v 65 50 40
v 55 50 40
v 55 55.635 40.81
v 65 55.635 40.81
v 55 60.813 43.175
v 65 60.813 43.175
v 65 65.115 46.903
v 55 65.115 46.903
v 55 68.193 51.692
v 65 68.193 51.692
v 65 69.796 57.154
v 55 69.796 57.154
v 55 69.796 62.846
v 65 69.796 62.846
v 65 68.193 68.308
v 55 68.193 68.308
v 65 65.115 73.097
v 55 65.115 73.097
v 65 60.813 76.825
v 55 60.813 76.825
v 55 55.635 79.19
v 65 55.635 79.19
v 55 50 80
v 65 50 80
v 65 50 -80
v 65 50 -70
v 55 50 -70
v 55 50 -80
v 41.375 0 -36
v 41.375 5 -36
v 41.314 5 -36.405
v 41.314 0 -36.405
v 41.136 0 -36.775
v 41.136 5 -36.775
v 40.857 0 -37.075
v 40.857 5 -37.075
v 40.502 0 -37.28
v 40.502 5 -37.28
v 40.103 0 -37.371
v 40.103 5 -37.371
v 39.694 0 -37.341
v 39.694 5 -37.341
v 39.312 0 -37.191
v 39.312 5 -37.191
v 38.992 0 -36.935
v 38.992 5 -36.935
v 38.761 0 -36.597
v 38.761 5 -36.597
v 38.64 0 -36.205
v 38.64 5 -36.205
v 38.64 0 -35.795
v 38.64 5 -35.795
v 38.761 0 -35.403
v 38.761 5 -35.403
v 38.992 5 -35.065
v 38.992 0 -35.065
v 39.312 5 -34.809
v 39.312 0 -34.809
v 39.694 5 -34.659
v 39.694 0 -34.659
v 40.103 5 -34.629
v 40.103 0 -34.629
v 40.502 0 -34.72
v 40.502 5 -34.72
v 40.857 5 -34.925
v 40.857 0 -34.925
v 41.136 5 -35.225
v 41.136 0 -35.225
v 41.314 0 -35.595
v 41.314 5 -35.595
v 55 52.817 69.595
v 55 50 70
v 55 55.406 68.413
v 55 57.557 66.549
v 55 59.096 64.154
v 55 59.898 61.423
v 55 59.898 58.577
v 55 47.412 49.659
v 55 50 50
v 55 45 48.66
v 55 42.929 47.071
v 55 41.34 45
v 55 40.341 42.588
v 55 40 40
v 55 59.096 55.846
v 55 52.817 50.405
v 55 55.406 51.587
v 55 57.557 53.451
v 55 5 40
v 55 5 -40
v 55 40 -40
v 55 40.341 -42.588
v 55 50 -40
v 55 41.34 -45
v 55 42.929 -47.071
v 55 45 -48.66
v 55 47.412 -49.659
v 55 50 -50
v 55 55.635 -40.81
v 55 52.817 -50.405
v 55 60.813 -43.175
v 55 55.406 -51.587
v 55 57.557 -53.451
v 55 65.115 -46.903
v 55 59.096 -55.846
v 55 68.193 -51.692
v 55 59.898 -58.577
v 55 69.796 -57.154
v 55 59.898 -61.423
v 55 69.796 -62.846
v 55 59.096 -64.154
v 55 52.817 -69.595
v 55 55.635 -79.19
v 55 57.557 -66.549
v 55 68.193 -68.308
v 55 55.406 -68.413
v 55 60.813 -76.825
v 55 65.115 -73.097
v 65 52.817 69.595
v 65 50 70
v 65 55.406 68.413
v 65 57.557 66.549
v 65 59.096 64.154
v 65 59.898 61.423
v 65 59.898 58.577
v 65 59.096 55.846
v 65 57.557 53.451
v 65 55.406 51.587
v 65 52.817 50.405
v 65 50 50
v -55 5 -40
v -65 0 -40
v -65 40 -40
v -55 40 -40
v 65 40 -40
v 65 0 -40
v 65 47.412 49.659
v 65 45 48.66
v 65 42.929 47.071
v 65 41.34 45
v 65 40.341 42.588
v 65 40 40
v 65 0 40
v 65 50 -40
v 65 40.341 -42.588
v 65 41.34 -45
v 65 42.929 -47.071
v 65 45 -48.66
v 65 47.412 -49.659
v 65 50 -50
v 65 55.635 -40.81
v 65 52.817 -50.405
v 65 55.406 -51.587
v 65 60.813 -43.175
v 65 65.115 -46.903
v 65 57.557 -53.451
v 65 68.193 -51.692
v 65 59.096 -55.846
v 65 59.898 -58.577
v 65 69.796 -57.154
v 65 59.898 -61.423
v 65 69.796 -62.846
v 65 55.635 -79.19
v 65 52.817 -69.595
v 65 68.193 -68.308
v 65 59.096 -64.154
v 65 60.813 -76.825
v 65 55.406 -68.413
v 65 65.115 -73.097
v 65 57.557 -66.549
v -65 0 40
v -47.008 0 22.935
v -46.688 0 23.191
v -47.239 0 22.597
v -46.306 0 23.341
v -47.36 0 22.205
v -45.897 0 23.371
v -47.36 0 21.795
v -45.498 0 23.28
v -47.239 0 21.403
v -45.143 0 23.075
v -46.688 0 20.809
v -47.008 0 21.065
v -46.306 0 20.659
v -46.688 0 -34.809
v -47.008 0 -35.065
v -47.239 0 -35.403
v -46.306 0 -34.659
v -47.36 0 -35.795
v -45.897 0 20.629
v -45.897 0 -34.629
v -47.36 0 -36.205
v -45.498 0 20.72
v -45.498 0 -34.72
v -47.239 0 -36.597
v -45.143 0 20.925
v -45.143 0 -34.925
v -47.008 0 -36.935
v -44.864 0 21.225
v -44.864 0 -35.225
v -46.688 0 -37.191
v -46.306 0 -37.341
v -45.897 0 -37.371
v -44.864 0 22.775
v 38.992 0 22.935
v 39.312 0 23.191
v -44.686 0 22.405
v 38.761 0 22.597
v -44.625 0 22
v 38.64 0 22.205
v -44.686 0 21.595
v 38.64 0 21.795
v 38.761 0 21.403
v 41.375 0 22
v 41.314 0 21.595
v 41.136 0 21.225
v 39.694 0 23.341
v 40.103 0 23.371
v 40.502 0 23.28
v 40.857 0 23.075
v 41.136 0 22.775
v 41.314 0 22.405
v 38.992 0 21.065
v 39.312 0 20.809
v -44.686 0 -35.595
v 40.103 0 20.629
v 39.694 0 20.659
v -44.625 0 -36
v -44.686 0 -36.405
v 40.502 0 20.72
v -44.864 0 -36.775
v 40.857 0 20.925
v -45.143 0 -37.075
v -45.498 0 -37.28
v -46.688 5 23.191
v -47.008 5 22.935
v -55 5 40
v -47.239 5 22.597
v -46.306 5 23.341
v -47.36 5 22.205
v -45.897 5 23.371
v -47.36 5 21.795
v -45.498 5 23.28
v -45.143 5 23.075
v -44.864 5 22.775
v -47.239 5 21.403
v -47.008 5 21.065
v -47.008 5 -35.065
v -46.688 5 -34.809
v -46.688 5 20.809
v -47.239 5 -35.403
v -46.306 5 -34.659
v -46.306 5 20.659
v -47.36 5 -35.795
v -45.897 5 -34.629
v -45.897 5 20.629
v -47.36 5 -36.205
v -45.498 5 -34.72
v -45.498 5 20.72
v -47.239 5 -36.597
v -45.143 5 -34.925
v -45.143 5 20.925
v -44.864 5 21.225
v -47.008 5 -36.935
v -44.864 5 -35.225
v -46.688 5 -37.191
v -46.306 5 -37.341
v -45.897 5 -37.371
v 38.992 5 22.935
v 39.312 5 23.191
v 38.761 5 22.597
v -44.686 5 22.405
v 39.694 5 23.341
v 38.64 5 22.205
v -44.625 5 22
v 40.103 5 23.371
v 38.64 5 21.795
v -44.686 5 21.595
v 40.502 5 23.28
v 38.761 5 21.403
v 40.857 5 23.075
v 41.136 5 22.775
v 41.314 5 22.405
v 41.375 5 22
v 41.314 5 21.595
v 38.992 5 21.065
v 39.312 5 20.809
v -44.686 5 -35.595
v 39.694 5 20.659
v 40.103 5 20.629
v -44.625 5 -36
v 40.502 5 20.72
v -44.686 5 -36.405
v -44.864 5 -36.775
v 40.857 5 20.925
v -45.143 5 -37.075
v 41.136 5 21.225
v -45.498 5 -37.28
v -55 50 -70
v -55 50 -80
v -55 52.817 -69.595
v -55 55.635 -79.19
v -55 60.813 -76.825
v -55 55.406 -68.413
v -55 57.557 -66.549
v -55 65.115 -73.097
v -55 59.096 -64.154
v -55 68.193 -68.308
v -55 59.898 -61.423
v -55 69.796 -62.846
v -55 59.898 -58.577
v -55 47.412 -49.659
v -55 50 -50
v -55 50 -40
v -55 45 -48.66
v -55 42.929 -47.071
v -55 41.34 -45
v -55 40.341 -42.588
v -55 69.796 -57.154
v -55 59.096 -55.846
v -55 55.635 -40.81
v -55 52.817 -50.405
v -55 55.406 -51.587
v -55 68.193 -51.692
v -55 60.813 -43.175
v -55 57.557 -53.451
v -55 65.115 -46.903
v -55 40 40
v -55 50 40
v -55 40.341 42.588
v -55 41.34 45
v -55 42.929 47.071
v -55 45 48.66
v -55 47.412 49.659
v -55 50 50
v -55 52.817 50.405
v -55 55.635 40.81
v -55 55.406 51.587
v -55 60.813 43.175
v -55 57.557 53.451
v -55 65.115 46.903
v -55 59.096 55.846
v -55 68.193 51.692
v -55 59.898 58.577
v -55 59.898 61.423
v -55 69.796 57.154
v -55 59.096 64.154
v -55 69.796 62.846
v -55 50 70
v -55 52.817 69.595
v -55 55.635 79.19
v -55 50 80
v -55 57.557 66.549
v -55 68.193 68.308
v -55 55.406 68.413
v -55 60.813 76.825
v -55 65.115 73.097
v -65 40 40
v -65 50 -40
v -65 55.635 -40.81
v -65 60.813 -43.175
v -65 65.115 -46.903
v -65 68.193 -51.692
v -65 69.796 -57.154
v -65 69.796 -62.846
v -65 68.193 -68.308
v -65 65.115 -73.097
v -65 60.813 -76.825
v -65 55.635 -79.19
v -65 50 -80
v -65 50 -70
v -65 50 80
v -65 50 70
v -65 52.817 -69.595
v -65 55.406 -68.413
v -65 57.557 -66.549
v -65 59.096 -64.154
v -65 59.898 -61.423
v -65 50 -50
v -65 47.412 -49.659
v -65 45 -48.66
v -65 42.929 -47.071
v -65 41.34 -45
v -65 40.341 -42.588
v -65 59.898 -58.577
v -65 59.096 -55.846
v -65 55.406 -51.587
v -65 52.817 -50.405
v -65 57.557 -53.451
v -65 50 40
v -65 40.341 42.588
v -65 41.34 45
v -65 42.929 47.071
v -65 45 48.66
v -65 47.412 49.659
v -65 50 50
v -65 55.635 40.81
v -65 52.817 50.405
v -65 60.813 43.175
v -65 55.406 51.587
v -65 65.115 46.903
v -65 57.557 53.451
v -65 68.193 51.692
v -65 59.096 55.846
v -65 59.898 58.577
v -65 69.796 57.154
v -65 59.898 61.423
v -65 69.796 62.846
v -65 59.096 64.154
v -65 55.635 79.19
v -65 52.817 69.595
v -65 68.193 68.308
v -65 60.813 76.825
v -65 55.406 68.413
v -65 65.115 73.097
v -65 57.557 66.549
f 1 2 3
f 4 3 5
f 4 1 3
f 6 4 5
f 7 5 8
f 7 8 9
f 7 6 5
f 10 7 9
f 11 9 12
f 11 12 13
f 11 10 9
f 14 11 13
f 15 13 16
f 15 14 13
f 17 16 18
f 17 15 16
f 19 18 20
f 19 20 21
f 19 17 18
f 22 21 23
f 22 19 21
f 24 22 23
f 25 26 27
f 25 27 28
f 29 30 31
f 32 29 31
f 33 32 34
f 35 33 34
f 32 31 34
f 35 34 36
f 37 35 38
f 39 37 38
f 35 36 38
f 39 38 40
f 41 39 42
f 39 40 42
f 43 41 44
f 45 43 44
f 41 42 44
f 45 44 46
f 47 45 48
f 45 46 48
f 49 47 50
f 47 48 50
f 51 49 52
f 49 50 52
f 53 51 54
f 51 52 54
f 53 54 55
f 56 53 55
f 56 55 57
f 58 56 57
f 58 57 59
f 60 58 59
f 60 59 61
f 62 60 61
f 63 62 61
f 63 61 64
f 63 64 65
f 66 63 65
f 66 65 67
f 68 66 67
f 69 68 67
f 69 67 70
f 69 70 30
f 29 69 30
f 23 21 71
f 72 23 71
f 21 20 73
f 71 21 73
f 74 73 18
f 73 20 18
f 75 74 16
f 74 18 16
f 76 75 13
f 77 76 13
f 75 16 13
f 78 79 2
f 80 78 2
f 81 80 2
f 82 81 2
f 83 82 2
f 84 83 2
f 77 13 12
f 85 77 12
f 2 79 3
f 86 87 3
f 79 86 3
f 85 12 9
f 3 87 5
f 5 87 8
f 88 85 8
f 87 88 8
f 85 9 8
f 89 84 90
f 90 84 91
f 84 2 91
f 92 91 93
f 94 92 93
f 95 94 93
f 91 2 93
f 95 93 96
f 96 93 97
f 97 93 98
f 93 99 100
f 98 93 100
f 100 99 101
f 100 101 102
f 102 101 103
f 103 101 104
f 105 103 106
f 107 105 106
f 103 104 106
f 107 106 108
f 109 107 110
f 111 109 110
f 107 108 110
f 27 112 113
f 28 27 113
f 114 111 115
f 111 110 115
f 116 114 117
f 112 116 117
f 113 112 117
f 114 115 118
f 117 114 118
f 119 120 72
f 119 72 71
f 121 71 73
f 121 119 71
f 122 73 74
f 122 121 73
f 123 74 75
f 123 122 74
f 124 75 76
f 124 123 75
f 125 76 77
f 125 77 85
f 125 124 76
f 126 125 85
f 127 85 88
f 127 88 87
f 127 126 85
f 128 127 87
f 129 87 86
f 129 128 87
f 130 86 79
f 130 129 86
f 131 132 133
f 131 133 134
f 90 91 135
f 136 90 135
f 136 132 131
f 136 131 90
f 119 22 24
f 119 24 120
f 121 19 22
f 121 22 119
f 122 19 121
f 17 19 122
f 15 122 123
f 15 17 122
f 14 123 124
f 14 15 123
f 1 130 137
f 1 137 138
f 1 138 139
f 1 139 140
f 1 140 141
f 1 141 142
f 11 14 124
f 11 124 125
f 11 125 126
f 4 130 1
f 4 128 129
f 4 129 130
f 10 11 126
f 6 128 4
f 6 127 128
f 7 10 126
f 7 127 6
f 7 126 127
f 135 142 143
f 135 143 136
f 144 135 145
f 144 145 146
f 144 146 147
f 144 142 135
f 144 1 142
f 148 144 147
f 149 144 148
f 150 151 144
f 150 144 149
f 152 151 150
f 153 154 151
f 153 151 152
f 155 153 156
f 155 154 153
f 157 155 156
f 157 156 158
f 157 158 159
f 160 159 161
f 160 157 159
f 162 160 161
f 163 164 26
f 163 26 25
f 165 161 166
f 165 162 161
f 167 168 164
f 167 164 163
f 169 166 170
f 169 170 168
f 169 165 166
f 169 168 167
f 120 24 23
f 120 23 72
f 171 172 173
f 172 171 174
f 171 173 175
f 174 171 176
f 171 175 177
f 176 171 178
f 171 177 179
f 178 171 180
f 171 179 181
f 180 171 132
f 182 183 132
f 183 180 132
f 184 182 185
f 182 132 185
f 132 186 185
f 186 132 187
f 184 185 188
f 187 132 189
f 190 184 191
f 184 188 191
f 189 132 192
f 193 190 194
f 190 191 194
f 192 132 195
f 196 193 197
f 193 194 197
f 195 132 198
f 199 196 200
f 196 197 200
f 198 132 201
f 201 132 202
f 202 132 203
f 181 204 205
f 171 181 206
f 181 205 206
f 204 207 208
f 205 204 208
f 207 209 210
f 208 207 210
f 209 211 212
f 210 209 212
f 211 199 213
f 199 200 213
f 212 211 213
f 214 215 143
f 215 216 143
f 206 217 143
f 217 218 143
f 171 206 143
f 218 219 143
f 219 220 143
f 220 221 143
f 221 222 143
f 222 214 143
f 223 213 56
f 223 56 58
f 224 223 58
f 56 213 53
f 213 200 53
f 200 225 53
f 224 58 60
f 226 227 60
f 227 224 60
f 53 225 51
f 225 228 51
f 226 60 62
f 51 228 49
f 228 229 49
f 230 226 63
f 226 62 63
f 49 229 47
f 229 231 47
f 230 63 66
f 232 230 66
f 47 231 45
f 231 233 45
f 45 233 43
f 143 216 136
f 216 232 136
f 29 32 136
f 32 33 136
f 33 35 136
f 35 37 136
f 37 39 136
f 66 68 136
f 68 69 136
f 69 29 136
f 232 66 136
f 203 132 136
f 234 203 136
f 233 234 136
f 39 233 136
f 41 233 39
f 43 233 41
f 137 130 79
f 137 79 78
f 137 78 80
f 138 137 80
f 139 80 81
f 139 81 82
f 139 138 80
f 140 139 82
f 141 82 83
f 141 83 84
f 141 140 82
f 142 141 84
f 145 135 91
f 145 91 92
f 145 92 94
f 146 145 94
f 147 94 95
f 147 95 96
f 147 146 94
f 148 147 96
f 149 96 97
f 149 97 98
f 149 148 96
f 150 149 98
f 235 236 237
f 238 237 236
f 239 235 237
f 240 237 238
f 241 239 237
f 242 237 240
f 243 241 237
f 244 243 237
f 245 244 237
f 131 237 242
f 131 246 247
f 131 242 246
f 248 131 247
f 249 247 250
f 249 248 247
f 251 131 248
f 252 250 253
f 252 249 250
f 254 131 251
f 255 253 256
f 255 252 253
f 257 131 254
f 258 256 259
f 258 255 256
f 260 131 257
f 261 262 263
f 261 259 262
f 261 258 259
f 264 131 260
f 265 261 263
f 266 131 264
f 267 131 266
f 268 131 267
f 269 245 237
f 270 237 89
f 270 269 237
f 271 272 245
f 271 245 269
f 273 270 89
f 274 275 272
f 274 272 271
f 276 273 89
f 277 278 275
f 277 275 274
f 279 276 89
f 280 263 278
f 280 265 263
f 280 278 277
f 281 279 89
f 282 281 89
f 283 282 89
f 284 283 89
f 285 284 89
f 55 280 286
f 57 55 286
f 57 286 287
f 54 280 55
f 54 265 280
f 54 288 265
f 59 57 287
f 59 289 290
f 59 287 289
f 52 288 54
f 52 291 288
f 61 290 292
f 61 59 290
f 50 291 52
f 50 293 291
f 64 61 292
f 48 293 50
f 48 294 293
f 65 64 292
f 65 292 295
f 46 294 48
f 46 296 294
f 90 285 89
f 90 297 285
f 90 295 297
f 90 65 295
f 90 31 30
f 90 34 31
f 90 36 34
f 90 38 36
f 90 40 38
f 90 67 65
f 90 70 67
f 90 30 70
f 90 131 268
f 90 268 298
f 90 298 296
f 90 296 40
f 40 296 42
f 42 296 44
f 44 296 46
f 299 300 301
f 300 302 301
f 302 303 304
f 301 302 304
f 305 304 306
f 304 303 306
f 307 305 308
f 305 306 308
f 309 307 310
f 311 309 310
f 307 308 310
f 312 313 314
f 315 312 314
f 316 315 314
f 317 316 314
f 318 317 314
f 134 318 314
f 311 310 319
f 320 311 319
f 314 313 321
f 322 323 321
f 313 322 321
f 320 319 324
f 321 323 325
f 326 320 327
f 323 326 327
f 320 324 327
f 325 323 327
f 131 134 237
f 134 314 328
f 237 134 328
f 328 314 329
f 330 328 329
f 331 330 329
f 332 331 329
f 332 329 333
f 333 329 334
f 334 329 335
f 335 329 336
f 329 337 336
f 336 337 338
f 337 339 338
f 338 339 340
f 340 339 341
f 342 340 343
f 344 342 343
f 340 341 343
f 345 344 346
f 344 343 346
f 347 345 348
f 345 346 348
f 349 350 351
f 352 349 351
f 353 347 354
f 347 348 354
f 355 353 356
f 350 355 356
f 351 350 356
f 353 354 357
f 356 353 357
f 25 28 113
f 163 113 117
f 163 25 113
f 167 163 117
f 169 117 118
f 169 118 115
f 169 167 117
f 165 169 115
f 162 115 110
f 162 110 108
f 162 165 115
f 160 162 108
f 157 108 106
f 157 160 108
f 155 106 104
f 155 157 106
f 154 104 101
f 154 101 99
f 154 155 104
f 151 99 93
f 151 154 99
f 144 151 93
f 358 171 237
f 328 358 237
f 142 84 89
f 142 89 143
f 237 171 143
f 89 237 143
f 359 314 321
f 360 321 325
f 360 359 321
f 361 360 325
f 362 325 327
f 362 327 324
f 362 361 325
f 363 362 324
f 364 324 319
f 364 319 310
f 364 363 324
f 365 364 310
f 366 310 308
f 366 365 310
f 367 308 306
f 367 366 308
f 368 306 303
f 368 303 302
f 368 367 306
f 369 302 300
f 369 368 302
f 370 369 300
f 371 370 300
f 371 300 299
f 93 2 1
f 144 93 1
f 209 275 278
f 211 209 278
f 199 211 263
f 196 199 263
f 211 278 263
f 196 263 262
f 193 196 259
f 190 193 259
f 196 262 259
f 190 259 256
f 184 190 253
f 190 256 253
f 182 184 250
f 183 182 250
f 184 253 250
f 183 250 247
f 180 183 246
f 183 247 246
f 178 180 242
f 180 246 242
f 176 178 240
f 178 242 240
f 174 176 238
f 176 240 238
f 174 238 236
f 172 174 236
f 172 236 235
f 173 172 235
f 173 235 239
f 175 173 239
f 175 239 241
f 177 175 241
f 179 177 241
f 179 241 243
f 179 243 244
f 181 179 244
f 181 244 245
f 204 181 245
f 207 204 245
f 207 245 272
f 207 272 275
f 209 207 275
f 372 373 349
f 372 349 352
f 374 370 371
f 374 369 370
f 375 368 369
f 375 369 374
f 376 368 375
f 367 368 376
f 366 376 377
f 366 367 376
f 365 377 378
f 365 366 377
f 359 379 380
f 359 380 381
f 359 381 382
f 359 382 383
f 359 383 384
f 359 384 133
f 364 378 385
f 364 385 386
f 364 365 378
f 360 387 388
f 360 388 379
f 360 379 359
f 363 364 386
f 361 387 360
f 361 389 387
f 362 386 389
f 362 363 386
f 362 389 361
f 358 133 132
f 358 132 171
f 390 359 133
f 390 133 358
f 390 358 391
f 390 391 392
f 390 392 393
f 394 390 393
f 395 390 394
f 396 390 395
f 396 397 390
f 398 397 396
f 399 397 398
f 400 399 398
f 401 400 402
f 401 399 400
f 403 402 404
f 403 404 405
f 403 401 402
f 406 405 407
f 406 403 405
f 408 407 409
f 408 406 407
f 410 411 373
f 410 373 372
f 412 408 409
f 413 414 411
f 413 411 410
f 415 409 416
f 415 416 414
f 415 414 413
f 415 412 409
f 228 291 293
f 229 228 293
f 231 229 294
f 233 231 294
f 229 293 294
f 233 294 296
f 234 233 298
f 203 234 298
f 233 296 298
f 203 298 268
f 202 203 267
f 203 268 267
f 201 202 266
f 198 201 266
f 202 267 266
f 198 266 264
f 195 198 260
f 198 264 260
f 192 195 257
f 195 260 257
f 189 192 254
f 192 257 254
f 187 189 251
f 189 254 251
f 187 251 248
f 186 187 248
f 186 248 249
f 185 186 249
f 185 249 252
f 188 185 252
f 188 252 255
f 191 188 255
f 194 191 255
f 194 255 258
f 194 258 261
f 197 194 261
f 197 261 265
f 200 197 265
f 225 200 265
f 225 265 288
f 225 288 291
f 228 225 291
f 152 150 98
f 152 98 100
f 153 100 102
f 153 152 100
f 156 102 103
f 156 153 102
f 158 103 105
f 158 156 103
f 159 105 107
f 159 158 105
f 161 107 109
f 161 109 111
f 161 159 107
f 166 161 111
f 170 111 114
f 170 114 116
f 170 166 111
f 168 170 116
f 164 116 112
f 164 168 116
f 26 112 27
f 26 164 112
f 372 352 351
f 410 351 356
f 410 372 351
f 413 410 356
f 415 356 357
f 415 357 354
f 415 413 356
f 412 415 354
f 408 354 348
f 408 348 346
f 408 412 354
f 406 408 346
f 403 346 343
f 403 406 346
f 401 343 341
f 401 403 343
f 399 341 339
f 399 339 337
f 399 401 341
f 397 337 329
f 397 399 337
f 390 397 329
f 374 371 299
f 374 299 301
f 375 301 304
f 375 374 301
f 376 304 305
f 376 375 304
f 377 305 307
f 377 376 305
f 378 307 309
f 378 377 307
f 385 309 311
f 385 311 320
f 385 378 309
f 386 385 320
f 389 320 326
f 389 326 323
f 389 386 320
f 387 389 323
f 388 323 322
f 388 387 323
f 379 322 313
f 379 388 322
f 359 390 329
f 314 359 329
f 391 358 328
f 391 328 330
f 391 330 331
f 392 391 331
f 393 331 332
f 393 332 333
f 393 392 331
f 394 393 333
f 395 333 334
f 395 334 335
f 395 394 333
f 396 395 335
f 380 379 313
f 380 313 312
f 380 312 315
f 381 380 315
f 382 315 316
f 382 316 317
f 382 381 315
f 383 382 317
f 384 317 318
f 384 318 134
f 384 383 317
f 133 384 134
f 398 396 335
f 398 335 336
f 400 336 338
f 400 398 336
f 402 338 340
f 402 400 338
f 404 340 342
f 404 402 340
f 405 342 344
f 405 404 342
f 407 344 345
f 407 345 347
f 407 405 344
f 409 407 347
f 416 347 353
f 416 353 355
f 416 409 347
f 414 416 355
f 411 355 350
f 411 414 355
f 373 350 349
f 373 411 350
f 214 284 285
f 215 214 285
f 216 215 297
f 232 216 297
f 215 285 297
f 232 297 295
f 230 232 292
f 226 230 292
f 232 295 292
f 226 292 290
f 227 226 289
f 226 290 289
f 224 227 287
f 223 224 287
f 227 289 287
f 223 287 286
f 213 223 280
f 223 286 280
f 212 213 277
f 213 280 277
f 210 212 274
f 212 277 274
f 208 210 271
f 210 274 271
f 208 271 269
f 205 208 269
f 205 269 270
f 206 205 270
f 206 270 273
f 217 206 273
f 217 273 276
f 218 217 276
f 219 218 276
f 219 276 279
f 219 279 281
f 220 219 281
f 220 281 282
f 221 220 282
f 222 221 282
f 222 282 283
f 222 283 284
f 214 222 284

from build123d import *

# Parameters (mm, degrees)
SKETCH1_W               = 130
SKETCH1_H               = 80
BOSS_EXTRUDE1_DEPTH     = 5
SKETCH2_W               = 10
SKETCH2_H               = 80
BOSS_EXTRUDE2_DEPTH     = 45
SKETCH3_R               = 1.375
CUT_EXTRUDE1_DEPTH      = 46
CUT_EXTRUDE1_DEPTH_BACK = 6
BOSS_EXTRUDE3_DEPTH     = 10
BOSS_EXTRUDE4_DEPTH     = 10


with BuildPart() as part:
    # Sketch1 → Boss-Extrude1 (new body)
    with BuildSketch(Plane(origin=(0, 0, 0), x_dir=(1, 0, 0), z_dir=(0, 1, 0))):
        Rectangle(SKETCH1_W, SKETCH1_H)
    extrude(amount=BOSS_EXTRUDE1_DEPTH)

    # Sketch2 → Boss-Extrude2 (add)
    with BuildSketch(Plane(origin=(0, 5, 0), x_dir=(1, 0, 0), z_dir=(0, 1, 0))):
        with Locations((60, 0)):
            Rectangle(SKETCH2_W, SKETCH2_H)
        with Locations((-60, 0)):
            Rectangle(SKETCH2_W, SKETCH2_H)
    extrude(amount=BOSS_EXTRUDE2_DEPTH)

    # Sketch3 → Cut-Extrude1 (cut, two sides)
    with BuildSketch(Plane(origin=(0, 5, 0), x_dir=(1, 0, 0), z_dir=(0, 1, 0))) as cut_extrude1_sk:
        with Locations((-46, -22)):
            Circle(SKETCH3_R)
        with Locations((40, -22)):
            Circle(SKETCH3_R)
        with Locations((40, 36)):
            Circle(SKETCH3_R)
        with Locations((-46, 36)):
            Circle(SKETCH3_R)
    extrude(amount=CUT_EXTRUDE1_DEPTH, mode=Mode.SUBTRACT)
    extrude(cut_extrude1_sk.sketch, amount=-CUT_EXTRUDE1_DEPTH_BACK, mode=Mode.SUBTRACT)

    # Sketch4 → Boss-Extrude3 (add)
    with BuildSketch(Plane.ZY.offset(65)):
        with BuildLine():
            Line((-80, 50), (-70, 50))
            ThreePointArc((-70, 50), (-60, 60), (-50, 50))
            Line((-50, 50), (-40, 50))
            ThreePointArc((-40, 50), (-60, 70), (-80, 50))
        make_face()
        with BuildLine():
            Line((-40, 50), (-50, 50))
            ThreePointArc((-50, 50), (-47.071067812, 42.928932188), (-40, 40))
            Line((-40, 40), (-40, 50))
        make_face()
        with BuildLine():
            ThreePointArc((50, 50), (60, 60), (70, 50))
            Line((70, 50), (80, 50))
            ThreePointArc((80, 50), (60, 70), (40, 50))
            Line((40, 50), (50, 50))
        make_face()
        with BuildLine():
            ThreePointArc((40, 40), (47.071067812, 42.928932188), (50, 50))
            Line((50, 50), (40, 50))
            Line((40, 50), (40, 40))
        make_face()
    extrude(amount=-BOSS_EXTRUDE3_DEPTH)

    # Sketch5 → Boss-Extrude4 (add)
    with BuildSketch(Plane(origin=(65, 0, 0), x_dir=(0, 0, -1), z_dir=(1, 0, 0))):
        with BuildLine():
            ThreePointArc((-50, 50), (-47.071067812, 42.928932188), (-40, 40))
            Line((-40, 40), (-40, 50))
            ThreePointArc((-40, 50), (-60, 70), (-80, 50))
            Line((-80, 50), (-70, 50))
            ThreePointArc((-70, 50), (-60, 60), (-50, 50))
        make_face()
        with BuildLine():
            Line((40, 50), (40, 40))
            ThreePointArc((40, 40), (47.071067812, 42.928932188), (50, 50))
            ThreePointArc((50, 50), (60, 60), (70, 50))
            Line((70, 50), (80, 50))
            ThreePointArc((80, 50), (60, 70), (40, 50))
        make_face()
    extrude(amount=-BOSS_EXTRUDE4_DEPTH)


solid = part.part
